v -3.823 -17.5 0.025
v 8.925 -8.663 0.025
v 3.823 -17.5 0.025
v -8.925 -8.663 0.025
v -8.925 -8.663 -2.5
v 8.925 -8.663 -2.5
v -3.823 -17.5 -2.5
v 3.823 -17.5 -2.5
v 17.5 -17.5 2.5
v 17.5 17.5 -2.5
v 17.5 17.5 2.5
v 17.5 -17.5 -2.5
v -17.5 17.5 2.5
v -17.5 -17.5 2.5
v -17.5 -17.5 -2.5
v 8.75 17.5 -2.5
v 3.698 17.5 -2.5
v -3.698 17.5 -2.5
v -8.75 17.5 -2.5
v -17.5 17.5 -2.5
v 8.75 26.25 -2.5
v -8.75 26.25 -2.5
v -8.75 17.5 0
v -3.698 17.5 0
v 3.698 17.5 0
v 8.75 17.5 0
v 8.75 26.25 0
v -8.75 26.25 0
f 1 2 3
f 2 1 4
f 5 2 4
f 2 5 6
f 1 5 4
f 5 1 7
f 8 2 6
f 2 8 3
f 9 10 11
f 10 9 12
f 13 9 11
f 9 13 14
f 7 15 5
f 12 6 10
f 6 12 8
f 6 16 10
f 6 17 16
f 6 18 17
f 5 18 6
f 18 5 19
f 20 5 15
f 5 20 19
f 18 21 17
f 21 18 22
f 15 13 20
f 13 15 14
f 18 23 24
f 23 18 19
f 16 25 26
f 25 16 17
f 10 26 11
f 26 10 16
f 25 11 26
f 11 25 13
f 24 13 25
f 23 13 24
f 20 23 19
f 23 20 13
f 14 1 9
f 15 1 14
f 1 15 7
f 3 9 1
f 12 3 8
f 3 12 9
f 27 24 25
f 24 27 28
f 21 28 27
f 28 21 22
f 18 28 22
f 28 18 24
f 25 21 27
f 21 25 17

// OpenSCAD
/* [Hidden] */
// Special variables
// Minimum angle
$fa = 1;
// Minimum size
$fs = 0.1;

/* [Tabs and Slots] */
// South Tab
tabSouth = true;
// North Tab
tabNorth = false;
// East Tab
tabEast = false;
// West Tab
tabWest = false;

// Between Tabs (Above) and Slots (Below)
spacer = 0; // [0]

// South Slot
slotSouth = false;
// North Slot
slotNorth = true;
// East Slot
slotEast = false;
// West Slot
slotWest = false;

/* [Scale and clearance] */
// Better to use squareSize and squareHeight
// for changing the size
// Scale of output
scale = 1; // [0.01:0.01:10]
// Clearance, makes slots bigger
clearance = 0.02; // [0:0.01:0.1]

/* [Size and Height] */
// Size in millimeters
squareSize = 35;
// Height in millimeters
squareHeight = 5;

// Presets, should normally not be changed
// Tab
tabHeight = squareHeight / 2;
tabLength = squareSize / 4;

/* [Colors for previews] */
// See wiki: https://en.wikibooks.org/wiki/OpenSCAD_User_Manual/Transformations#color
// Color of Square
squareColor = "Aqua";
// Color of Tabs
tabColor = "RoyalBlue";
// Color of Slots
slotColor = "Magenta";

/* [Hidden] */ // Just in case, normally not shown by default
// Tab Cutout
tabCutoutWidth = tabLength * 0.5;
tabCutoutLength = tabLength * 2;
// The "+1" makes it look better in previews,
// and dosen't modify anything
tabCutoutHeight = tabHeight + 1;

// Square module
module square() {
  color(squareColor)
    cube([squareSize, squareSize, squareHeight], center=true);
}


// https://english.stackexchange.com/a/47672
// Tabs module
module tab() {
  difference() {
    // Main tab square
    cube([squareSize / 2, tabLength, tabHeight], center=true);
    // Left cutout
    translate([-tabLength, 0, 0]) {
      rotate([0, 0, 30]) {
        cube([tabCutoutWidth, tabCutoutLength, tabCutoutHeight], center=true);
      }
    }
    // Right cutout
    translate([tabLength, 0, 0]) {
      rotate([0, 0, -30]) {
        cube([tabCutoutWidth, tabCutoutLength, tabCutoutHeight], center=true);
      }
    }
  }
}

// https://minecraft.gamepedia.com/Coordinates
// South
tabPositiveY = [0, squareSize / 2 + tabLength / 2, -tabHeight / 2];
// North
tabNegativeY = [0, -squareSize / 2 - tabLength / 2, -tabHeight / 2];
// East
tabPositiveX = [squareSize / 2 + tabLength / 2, 0, -tabHeight / 2];
// West
tabNegativeX = [-squareSize / 2 - tabLength / 2, 0, -tabHeight / 2];

// Tab positions
module tabSouth() {
  translate(tabPositiveY)
    rotate([0, 0, 0])
      tab();
}
module tabNorth() {
  translate(tabNegativeY)
    rotate([0, 0, 180])
      tab();
}
module tabEast() {
  translate(tabPositiveX)
    rotate([0, 0, -90])
      tab();
}
module tabWest() {
  translate(tabNegativeX)
    rotate([0, 0, 90])
      tab();
}


module slot() {
  // Adding clearance
  scale([1 + clearance, 1 + clearance, 1 + clearance])
    tab();
}

// South
slotPositiveY = [0, squareSize / 2 - tabLength / 2, -tabHeight / 2];
// North
slotNegativeY = [0, -squareSize / 2 + tabLength / 2, -tabHeight / 2];
// East
slotPositiveX = [squareSize / 2 - tabLength / 2, 0, -tabHeight / 2];
// West
slotNegativeX = [-squareSize / 2 + tabLength / 2, 0, -tabHeight / 2];

// Slots module
module slotSouth() {
  translate(slotPositiveY)
    rotate([0, 0, 180])
      slot();
}
module slotNorth() {
  translate(slotNegativeY)
    rotate([0, 0, 0])
      slot();
}
module slotEast() {
  translate(slotPositiveX)
    rotate([0, 0, 90])
      slot();
}
module slotWest() {
  translate(slotNegativeX)
    rotate([0, 0, -90])
      slot();
}








scale(scale) {
  difference() {
    square();
    color(slotColor) {
      if(slotSouth) slotSouth();
      if(slotNorth) slotNorth();
      if(slotEast) slotEast();
      if(slotWest) slotWest();
    }
  }
  color(tabColor) {
    if(tabSouth) tabSouth();
    if(tabNorth) tabNorth();
    if(tabEast) tabEast();
    if(tabWest) tabWest();
  }
}
